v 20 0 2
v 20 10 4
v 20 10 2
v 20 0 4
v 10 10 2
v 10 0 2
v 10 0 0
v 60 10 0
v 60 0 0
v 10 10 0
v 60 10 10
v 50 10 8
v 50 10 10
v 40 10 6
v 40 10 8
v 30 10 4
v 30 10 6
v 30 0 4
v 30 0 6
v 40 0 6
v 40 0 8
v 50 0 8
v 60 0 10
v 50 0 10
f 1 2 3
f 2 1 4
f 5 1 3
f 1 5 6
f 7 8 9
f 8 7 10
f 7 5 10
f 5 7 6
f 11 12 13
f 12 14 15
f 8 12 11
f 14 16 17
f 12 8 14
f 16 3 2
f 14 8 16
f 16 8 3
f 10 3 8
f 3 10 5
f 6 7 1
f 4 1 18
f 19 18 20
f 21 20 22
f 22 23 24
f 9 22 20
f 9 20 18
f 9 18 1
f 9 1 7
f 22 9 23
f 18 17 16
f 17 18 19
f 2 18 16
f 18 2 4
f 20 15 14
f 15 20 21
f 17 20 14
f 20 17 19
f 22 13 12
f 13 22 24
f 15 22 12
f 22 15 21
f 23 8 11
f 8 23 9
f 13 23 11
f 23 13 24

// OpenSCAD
for(i = [1:5]) {
	translate([i * 10, 0, 0]) {
		cube([10, 10, 2 * i]);
	}
}
